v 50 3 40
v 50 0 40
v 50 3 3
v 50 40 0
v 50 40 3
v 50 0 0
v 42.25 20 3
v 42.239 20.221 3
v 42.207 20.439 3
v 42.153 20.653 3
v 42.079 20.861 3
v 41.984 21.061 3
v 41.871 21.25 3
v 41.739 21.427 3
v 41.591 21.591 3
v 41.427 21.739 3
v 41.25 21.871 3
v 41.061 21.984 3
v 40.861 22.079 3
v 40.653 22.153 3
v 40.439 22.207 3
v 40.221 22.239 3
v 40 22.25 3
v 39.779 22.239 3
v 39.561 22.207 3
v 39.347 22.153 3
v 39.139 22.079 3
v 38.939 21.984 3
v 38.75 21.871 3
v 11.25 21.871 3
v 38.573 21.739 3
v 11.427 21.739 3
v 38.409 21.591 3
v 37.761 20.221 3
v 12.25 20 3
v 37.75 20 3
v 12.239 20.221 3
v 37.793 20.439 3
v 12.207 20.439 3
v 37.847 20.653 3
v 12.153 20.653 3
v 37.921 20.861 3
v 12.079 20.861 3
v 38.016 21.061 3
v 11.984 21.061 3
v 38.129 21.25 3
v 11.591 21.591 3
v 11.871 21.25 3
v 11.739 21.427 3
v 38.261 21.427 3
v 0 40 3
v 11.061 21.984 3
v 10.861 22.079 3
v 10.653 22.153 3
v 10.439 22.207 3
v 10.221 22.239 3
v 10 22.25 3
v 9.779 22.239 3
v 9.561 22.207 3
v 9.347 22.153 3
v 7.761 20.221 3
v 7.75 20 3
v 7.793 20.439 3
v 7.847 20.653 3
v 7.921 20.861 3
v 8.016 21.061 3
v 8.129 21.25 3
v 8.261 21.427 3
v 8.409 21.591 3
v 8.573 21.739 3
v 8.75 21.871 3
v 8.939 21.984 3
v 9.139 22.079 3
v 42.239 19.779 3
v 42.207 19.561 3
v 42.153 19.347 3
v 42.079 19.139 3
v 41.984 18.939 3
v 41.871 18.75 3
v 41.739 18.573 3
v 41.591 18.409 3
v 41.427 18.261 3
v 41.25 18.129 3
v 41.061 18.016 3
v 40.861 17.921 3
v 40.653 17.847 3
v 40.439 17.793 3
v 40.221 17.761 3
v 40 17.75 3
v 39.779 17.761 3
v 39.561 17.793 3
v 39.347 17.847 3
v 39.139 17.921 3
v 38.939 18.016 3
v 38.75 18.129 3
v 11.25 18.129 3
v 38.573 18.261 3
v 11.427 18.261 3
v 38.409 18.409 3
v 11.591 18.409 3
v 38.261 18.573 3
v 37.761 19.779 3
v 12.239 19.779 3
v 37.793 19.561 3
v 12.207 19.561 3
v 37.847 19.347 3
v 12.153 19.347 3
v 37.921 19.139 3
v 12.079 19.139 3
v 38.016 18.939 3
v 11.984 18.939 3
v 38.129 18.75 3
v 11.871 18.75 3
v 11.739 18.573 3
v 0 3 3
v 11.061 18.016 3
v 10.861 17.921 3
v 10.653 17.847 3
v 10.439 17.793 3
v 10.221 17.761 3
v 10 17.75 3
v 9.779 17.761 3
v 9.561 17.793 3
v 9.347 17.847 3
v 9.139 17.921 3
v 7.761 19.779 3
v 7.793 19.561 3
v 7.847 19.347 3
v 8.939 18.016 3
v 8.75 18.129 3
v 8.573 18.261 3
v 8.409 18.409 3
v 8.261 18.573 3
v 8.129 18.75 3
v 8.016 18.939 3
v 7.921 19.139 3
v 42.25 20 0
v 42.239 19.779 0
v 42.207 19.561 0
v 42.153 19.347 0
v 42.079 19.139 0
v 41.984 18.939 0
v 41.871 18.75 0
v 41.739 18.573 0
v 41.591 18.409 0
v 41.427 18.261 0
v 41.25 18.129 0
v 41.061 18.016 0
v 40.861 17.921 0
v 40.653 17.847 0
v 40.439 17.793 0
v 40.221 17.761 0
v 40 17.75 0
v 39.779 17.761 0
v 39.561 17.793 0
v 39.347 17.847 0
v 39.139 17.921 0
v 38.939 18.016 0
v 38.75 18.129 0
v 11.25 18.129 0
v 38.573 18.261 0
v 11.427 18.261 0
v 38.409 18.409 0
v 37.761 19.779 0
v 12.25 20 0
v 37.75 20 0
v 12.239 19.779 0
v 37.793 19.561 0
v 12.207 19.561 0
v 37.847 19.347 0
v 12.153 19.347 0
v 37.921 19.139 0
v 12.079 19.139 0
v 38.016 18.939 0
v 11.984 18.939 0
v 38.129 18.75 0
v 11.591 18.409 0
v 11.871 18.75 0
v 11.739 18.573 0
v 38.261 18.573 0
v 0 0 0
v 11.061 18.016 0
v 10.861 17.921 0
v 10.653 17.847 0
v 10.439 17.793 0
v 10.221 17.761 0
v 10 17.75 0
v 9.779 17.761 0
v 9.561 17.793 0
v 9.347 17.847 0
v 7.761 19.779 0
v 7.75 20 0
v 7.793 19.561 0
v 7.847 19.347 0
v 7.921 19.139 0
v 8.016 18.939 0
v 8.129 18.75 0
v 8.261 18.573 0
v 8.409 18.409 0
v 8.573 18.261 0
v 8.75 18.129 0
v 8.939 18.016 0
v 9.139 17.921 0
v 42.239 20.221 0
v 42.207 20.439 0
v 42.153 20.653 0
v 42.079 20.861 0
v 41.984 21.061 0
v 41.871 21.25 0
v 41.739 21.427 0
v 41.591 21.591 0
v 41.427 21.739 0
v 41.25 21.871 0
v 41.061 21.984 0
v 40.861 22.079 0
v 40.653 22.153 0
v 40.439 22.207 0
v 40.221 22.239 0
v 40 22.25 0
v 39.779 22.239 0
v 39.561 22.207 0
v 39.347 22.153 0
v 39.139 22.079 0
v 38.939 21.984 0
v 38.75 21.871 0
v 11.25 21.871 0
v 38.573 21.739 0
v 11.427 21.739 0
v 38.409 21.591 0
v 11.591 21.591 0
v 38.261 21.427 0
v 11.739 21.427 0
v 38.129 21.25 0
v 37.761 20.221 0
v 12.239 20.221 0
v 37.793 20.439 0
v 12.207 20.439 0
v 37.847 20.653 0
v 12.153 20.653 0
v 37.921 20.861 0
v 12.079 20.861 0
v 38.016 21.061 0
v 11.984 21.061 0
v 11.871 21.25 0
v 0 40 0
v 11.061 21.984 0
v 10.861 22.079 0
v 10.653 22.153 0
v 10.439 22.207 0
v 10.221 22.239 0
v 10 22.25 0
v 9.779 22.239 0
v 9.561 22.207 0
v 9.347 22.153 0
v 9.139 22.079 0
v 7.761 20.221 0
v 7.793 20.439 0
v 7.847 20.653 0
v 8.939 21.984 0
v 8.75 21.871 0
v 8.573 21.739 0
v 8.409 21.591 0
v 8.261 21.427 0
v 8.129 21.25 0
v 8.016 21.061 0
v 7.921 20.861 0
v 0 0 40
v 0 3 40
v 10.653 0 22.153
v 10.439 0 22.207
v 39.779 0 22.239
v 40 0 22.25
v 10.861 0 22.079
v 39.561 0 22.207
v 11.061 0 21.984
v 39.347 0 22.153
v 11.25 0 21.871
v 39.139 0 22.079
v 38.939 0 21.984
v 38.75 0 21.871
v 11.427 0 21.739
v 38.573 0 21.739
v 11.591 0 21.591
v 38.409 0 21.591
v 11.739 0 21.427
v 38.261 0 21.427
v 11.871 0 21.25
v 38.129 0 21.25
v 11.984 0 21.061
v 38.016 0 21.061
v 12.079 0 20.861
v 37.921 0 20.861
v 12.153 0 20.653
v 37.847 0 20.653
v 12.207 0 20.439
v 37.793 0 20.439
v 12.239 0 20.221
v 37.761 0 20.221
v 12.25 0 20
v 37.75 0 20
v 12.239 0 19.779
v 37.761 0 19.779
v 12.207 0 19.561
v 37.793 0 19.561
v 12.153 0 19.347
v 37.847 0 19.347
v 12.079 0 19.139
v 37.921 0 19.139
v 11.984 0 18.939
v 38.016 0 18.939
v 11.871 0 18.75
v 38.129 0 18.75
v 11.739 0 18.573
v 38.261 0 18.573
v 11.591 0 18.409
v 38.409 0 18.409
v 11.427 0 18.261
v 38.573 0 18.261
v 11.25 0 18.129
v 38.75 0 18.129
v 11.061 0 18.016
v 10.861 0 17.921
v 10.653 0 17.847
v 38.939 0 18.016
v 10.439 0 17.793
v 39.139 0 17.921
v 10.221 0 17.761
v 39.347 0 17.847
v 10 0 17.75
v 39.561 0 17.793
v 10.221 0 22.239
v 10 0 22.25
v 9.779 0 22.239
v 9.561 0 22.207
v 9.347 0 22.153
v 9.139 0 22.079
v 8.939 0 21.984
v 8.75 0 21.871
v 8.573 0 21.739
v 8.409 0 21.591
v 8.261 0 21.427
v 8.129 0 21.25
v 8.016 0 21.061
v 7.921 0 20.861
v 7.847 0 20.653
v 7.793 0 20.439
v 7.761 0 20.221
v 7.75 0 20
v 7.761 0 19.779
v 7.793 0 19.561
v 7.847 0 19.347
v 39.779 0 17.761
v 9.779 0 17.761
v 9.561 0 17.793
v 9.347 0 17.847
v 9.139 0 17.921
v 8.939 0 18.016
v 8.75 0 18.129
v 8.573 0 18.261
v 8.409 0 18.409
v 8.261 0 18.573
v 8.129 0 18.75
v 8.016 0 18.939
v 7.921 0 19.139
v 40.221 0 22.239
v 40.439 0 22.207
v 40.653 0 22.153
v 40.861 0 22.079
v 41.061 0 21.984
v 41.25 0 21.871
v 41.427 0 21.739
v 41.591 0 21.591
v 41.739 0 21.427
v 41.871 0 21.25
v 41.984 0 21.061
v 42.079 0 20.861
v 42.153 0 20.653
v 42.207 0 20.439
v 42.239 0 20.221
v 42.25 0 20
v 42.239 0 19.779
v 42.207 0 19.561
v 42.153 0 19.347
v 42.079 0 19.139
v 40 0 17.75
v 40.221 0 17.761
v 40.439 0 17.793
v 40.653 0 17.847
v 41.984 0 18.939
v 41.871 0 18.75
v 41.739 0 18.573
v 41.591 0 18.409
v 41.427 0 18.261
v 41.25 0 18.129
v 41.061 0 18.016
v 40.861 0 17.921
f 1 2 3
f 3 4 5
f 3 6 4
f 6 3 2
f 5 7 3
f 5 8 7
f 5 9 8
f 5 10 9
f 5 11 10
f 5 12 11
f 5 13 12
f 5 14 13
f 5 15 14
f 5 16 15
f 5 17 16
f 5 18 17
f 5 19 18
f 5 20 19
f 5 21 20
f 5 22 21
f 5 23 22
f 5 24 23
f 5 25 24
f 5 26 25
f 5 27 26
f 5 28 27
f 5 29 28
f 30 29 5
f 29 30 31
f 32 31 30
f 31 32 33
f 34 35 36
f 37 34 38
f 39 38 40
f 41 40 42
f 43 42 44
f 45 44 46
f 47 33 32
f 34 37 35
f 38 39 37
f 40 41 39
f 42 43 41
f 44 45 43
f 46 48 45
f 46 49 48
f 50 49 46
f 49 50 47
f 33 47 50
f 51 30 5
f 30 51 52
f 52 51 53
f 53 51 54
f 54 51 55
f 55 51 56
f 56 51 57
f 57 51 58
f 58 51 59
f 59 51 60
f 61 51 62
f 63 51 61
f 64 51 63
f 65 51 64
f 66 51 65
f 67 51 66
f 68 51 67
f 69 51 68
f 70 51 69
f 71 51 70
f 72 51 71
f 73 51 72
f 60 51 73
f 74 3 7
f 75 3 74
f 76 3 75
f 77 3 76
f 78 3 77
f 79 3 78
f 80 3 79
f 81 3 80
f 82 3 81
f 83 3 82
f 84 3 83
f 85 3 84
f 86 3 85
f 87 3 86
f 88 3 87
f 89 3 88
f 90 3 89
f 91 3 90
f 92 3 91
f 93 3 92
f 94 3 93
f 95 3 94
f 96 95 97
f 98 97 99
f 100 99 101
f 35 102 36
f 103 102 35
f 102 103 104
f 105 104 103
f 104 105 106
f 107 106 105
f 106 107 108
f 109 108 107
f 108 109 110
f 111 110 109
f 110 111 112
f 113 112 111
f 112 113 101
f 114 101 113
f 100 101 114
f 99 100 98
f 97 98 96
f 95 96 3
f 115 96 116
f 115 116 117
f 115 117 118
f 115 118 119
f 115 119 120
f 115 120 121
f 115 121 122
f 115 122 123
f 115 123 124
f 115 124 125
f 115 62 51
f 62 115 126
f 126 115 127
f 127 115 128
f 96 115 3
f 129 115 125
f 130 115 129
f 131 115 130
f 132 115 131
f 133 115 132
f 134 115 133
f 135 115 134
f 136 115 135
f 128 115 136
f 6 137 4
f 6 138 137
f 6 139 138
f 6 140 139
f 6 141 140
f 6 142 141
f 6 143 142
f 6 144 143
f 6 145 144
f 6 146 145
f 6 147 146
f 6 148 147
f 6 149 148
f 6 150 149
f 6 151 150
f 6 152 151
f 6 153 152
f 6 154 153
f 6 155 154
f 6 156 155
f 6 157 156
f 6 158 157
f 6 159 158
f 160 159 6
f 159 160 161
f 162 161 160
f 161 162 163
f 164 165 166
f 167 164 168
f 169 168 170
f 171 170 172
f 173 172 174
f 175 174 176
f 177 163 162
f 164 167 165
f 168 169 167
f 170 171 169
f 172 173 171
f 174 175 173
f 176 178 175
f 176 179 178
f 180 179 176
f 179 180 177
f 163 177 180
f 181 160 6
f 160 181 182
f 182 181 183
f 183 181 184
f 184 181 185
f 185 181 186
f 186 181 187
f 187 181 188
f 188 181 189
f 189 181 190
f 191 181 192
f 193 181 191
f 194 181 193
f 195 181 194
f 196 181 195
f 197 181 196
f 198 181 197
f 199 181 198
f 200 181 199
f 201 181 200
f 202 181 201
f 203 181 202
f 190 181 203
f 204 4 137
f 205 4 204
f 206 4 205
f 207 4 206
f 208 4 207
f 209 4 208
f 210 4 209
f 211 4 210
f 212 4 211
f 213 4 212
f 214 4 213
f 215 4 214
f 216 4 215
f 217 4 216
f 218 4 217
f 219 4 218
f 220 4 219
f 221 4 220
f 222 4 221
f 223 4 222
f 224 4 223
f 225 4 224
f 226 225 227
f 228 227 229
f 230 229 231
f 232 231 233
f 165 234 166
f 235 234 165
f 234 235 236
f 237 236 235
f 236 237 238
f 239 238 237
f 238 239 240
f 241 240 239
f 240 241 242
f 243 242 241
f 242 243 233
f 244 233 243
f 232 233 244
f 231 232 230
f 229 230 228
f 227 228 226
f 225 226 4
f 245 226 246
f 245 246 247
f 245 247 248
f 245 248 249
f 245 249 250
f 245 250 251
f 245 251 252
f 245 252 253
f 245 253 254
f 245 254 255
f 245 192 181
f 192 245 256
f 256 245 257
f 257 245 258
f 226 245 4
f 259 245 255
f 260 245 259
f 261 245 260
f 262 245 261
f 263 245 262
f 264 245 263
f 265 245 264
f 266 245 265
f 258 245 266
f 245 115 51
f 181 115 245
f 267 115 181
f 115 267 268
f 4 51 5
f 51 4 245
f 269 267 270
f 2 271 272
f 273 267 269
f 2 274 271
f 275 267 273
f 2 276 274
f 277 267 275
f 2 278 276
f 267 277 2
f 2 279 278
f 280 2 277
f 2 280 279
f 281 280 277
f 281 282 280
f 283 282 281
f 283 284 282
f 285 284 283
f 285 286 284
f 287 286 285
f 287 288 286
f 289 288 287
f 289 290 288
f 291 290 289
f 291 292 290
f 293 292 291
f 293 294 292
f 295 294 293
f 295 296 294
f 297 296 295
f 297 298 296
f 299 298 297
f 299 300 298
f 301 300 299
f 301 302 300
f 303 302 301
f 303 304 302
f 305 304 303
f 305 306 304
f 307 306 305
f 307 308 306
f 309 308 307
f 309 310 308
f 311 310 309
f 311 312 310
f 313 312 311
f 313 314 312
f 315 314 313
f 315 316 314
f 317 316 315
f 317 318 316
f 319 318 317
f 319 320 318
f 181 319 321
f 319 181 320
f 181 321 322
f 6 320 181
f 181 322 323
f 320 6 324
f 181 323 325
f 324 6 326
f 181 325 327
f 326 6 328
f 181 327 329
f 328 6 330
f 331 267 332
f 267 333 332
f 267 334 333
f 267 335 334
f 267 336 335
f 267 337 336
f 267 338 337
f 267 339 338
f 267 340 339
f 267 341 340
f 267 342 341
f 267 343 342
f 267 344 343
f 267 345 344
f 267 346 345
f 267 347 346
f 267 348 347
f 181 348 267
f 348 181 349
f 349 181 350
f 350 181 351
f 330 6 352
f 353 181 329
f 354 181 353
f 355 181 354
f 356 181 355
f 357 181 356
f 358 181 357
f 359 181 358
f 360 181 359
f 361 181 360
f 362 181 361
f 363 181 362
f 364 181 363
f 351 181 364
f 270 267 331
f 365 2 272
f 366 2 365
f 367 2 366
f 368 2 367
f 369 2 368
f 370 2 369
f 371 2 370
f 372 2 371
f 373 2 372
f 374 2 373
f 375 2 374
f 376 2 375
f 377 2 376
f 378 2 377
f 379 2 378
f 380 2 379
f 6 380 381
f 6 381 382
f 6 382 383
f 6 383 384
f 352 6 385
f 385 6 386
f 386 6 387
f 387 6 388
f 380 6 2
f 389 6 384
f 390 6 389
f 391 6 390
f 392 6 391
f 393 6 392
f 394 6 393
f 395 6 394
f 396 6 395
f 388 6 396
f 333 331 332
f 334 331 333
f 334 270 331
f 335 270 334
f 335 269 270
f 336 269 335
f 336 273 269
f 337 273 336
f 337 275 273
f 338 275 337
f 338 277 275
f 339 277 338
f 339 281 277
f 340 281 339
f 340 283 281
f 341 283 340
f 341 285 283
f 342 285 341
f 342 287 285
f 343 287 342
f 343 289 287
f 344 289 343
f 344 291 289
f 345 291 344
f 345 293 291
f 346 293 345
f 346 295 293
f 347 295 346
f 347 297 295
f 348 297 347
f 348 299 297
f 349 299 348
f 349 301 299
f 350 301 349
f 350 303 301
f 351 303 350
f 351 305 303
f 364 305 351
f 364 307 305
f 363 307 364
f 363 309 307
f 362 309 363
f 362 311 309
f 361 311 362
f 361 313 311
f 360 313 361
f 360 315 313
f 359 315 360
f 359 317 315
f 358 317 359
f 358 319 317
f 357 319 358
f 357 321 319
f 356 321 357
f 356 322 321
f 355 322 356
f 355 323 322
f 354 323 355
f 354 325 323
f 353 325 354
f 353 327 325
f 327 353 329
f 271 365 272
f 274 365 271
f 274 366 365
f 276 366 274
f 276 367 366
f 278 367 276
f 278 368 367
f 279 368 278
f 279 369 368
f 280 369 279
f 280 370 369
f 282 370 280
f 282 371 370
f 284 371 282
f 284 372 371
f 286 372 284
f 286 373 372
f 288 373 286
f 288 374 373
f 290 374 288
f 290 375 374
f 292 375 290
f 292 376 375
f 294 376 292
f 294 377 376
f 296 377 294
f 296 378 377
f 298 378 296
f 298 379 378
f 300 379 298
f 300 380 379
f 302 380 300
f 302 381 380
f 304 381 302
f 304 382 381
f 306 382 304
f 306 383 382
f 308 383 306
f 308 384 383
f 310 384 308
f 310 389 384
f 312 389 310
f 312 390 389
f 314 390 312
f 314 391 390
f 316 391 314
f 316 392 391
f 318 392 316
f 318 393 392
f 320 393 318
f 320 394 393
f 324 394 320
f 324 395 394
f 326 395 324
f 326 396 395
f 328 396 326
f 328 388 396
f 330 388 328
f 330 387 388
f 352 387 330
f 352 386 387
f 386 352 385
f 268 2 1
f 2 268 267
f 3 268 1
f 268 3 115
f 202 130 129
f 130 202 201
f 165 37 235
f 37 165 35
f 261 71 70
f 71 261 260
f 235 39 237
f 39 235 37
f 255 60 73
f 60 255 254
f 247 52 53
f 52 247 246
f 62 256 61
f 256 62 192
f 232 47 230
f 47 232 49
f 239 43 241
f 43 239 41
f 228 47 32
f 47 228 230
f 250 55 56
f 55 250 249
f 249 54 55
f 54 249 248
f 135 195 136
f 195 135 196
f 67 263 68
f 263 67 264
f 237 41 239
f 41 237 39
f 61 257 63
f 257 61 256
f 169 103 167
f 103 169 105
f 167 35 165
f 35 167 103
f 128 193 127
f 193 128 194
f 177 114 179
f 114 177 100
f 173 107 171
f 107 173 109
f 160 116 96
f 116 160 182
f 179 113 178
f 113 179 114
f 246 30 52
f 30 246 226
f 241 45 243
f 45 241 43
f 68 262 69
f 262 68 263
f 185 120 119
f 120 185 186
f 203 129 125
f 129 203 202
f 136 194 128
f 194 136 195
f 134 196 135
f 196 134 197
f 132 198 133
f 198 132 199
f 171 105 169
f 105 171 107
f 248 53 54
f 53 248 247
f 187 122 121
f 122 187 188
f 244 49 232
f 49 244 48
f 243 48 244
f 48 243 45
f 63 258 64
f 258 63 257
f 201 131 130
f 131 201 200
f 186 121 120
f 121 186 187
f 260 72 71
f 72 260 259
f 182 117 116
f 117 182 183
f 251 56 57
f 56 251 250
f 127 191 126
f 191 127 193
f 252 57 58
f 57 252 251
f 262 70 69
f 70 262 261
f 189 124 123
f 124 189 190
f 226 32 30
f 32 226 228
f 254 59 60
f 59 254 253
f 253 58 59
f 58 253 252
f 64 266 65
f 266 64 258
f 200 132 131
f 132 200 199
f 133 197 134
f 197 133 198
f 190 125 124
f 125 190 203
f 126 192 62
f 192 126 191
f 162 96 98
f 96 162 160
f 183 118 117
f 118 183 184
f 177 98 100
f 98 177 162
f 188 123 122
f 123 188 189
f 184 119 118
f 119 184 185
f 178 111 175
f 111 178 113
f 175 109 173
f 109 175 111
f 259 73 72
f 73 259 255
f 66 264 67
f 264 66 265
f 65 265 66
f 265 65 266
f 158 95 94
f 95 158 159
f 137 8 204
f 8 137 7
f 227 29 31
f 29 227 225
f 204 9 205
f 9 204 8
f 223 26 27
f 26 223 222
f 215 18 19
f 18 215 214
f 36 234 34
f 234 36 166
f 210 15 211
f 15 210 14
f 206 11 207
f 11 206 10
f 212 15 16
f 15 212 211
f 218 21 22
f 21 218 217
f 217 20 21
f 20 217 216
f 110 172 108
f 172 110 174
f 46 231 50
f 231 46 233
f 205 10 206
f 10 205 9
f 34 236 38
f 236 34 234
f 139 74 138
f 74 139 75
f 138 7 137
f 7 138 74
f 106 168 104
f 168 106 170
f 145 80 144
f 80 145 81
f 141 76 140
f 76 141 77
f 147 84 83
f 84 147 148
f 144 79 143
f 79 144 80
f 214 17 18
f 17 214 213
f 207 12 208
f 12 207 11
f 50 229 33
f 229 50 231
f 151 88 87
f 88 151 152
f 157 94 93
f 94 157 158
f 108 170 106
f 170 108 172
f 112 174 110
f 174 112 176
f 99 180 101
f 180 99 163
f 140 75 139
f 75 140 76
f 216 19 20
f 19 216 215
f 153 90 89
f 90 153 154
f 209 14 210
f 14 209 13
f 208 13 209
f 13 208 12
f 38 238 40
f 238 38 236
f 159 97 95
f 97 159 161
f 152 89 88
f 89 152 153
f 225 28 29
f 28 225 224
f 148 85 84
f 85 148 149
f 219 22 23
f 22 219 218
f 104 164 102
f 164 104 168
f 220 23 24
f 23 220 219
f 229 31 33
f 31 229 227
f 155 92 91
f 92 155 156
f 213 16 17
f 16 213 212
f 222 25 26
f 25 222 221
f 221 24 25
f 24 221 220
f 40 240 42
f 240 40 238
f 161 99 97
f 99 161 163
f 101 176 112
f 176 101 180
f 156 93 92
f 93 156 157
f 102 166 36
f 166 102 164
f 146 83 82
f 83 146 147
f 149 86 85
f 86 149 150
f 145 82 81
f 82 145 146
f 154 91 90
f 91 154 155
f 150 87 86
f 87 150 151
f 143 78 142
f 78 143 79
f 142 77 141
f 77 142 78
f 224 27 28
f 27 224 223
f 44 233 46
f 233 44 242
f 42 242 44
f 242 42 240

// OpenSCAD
$fn = 64; // smooth circles

module cs_hole_z(pos) {
    translate(pos)
        union() {
            // through hole
            cylinder(d = 4.5, h = 3, center = false);
            // countersink (outer side, +Z)
            translate([0, 0, 3])
                cylinder(r1 = 4.5/2, r2 = 8/2, h = 2, center = false);
        }
}

module cs_hole_y(pos) {
    translate(pos)
        rotate([90, 0, 0])  // align hole axis with +Y
        union() {
            // through hole
            cylinder(d = 4.5, h = 3, center = false);
            // countersink (outer side, +Y)
            translate([0, 0, 3])
                cylinder(r1 = 4.5/2, r2 = 8/2, h = 2, center = false);
        }
}

difference() {
    // L‑bracket body
    union() {
        // horizontal flange (extends +Y)
        translate([0, 0, 0])
            cube([50, 40, 3]);          // width X, depth Y, thickness Z

        // vertical flange (extends +Z)
        translate([0, 0, 0])
            cube([50, 3, 40]);          // width X, thickness Y, height Z
    }

    // holes on horizontal flange
    cs_hole_z([10, 20, 0]);   // left hole
    cs_hole_z([40, 20, 0]);   // right hole

    // holes on vertical flange
    cs_hole_y([10, 0, 20]);   // left hole
    cs_hole_y([40, 0, 20]);   // right hole
}
